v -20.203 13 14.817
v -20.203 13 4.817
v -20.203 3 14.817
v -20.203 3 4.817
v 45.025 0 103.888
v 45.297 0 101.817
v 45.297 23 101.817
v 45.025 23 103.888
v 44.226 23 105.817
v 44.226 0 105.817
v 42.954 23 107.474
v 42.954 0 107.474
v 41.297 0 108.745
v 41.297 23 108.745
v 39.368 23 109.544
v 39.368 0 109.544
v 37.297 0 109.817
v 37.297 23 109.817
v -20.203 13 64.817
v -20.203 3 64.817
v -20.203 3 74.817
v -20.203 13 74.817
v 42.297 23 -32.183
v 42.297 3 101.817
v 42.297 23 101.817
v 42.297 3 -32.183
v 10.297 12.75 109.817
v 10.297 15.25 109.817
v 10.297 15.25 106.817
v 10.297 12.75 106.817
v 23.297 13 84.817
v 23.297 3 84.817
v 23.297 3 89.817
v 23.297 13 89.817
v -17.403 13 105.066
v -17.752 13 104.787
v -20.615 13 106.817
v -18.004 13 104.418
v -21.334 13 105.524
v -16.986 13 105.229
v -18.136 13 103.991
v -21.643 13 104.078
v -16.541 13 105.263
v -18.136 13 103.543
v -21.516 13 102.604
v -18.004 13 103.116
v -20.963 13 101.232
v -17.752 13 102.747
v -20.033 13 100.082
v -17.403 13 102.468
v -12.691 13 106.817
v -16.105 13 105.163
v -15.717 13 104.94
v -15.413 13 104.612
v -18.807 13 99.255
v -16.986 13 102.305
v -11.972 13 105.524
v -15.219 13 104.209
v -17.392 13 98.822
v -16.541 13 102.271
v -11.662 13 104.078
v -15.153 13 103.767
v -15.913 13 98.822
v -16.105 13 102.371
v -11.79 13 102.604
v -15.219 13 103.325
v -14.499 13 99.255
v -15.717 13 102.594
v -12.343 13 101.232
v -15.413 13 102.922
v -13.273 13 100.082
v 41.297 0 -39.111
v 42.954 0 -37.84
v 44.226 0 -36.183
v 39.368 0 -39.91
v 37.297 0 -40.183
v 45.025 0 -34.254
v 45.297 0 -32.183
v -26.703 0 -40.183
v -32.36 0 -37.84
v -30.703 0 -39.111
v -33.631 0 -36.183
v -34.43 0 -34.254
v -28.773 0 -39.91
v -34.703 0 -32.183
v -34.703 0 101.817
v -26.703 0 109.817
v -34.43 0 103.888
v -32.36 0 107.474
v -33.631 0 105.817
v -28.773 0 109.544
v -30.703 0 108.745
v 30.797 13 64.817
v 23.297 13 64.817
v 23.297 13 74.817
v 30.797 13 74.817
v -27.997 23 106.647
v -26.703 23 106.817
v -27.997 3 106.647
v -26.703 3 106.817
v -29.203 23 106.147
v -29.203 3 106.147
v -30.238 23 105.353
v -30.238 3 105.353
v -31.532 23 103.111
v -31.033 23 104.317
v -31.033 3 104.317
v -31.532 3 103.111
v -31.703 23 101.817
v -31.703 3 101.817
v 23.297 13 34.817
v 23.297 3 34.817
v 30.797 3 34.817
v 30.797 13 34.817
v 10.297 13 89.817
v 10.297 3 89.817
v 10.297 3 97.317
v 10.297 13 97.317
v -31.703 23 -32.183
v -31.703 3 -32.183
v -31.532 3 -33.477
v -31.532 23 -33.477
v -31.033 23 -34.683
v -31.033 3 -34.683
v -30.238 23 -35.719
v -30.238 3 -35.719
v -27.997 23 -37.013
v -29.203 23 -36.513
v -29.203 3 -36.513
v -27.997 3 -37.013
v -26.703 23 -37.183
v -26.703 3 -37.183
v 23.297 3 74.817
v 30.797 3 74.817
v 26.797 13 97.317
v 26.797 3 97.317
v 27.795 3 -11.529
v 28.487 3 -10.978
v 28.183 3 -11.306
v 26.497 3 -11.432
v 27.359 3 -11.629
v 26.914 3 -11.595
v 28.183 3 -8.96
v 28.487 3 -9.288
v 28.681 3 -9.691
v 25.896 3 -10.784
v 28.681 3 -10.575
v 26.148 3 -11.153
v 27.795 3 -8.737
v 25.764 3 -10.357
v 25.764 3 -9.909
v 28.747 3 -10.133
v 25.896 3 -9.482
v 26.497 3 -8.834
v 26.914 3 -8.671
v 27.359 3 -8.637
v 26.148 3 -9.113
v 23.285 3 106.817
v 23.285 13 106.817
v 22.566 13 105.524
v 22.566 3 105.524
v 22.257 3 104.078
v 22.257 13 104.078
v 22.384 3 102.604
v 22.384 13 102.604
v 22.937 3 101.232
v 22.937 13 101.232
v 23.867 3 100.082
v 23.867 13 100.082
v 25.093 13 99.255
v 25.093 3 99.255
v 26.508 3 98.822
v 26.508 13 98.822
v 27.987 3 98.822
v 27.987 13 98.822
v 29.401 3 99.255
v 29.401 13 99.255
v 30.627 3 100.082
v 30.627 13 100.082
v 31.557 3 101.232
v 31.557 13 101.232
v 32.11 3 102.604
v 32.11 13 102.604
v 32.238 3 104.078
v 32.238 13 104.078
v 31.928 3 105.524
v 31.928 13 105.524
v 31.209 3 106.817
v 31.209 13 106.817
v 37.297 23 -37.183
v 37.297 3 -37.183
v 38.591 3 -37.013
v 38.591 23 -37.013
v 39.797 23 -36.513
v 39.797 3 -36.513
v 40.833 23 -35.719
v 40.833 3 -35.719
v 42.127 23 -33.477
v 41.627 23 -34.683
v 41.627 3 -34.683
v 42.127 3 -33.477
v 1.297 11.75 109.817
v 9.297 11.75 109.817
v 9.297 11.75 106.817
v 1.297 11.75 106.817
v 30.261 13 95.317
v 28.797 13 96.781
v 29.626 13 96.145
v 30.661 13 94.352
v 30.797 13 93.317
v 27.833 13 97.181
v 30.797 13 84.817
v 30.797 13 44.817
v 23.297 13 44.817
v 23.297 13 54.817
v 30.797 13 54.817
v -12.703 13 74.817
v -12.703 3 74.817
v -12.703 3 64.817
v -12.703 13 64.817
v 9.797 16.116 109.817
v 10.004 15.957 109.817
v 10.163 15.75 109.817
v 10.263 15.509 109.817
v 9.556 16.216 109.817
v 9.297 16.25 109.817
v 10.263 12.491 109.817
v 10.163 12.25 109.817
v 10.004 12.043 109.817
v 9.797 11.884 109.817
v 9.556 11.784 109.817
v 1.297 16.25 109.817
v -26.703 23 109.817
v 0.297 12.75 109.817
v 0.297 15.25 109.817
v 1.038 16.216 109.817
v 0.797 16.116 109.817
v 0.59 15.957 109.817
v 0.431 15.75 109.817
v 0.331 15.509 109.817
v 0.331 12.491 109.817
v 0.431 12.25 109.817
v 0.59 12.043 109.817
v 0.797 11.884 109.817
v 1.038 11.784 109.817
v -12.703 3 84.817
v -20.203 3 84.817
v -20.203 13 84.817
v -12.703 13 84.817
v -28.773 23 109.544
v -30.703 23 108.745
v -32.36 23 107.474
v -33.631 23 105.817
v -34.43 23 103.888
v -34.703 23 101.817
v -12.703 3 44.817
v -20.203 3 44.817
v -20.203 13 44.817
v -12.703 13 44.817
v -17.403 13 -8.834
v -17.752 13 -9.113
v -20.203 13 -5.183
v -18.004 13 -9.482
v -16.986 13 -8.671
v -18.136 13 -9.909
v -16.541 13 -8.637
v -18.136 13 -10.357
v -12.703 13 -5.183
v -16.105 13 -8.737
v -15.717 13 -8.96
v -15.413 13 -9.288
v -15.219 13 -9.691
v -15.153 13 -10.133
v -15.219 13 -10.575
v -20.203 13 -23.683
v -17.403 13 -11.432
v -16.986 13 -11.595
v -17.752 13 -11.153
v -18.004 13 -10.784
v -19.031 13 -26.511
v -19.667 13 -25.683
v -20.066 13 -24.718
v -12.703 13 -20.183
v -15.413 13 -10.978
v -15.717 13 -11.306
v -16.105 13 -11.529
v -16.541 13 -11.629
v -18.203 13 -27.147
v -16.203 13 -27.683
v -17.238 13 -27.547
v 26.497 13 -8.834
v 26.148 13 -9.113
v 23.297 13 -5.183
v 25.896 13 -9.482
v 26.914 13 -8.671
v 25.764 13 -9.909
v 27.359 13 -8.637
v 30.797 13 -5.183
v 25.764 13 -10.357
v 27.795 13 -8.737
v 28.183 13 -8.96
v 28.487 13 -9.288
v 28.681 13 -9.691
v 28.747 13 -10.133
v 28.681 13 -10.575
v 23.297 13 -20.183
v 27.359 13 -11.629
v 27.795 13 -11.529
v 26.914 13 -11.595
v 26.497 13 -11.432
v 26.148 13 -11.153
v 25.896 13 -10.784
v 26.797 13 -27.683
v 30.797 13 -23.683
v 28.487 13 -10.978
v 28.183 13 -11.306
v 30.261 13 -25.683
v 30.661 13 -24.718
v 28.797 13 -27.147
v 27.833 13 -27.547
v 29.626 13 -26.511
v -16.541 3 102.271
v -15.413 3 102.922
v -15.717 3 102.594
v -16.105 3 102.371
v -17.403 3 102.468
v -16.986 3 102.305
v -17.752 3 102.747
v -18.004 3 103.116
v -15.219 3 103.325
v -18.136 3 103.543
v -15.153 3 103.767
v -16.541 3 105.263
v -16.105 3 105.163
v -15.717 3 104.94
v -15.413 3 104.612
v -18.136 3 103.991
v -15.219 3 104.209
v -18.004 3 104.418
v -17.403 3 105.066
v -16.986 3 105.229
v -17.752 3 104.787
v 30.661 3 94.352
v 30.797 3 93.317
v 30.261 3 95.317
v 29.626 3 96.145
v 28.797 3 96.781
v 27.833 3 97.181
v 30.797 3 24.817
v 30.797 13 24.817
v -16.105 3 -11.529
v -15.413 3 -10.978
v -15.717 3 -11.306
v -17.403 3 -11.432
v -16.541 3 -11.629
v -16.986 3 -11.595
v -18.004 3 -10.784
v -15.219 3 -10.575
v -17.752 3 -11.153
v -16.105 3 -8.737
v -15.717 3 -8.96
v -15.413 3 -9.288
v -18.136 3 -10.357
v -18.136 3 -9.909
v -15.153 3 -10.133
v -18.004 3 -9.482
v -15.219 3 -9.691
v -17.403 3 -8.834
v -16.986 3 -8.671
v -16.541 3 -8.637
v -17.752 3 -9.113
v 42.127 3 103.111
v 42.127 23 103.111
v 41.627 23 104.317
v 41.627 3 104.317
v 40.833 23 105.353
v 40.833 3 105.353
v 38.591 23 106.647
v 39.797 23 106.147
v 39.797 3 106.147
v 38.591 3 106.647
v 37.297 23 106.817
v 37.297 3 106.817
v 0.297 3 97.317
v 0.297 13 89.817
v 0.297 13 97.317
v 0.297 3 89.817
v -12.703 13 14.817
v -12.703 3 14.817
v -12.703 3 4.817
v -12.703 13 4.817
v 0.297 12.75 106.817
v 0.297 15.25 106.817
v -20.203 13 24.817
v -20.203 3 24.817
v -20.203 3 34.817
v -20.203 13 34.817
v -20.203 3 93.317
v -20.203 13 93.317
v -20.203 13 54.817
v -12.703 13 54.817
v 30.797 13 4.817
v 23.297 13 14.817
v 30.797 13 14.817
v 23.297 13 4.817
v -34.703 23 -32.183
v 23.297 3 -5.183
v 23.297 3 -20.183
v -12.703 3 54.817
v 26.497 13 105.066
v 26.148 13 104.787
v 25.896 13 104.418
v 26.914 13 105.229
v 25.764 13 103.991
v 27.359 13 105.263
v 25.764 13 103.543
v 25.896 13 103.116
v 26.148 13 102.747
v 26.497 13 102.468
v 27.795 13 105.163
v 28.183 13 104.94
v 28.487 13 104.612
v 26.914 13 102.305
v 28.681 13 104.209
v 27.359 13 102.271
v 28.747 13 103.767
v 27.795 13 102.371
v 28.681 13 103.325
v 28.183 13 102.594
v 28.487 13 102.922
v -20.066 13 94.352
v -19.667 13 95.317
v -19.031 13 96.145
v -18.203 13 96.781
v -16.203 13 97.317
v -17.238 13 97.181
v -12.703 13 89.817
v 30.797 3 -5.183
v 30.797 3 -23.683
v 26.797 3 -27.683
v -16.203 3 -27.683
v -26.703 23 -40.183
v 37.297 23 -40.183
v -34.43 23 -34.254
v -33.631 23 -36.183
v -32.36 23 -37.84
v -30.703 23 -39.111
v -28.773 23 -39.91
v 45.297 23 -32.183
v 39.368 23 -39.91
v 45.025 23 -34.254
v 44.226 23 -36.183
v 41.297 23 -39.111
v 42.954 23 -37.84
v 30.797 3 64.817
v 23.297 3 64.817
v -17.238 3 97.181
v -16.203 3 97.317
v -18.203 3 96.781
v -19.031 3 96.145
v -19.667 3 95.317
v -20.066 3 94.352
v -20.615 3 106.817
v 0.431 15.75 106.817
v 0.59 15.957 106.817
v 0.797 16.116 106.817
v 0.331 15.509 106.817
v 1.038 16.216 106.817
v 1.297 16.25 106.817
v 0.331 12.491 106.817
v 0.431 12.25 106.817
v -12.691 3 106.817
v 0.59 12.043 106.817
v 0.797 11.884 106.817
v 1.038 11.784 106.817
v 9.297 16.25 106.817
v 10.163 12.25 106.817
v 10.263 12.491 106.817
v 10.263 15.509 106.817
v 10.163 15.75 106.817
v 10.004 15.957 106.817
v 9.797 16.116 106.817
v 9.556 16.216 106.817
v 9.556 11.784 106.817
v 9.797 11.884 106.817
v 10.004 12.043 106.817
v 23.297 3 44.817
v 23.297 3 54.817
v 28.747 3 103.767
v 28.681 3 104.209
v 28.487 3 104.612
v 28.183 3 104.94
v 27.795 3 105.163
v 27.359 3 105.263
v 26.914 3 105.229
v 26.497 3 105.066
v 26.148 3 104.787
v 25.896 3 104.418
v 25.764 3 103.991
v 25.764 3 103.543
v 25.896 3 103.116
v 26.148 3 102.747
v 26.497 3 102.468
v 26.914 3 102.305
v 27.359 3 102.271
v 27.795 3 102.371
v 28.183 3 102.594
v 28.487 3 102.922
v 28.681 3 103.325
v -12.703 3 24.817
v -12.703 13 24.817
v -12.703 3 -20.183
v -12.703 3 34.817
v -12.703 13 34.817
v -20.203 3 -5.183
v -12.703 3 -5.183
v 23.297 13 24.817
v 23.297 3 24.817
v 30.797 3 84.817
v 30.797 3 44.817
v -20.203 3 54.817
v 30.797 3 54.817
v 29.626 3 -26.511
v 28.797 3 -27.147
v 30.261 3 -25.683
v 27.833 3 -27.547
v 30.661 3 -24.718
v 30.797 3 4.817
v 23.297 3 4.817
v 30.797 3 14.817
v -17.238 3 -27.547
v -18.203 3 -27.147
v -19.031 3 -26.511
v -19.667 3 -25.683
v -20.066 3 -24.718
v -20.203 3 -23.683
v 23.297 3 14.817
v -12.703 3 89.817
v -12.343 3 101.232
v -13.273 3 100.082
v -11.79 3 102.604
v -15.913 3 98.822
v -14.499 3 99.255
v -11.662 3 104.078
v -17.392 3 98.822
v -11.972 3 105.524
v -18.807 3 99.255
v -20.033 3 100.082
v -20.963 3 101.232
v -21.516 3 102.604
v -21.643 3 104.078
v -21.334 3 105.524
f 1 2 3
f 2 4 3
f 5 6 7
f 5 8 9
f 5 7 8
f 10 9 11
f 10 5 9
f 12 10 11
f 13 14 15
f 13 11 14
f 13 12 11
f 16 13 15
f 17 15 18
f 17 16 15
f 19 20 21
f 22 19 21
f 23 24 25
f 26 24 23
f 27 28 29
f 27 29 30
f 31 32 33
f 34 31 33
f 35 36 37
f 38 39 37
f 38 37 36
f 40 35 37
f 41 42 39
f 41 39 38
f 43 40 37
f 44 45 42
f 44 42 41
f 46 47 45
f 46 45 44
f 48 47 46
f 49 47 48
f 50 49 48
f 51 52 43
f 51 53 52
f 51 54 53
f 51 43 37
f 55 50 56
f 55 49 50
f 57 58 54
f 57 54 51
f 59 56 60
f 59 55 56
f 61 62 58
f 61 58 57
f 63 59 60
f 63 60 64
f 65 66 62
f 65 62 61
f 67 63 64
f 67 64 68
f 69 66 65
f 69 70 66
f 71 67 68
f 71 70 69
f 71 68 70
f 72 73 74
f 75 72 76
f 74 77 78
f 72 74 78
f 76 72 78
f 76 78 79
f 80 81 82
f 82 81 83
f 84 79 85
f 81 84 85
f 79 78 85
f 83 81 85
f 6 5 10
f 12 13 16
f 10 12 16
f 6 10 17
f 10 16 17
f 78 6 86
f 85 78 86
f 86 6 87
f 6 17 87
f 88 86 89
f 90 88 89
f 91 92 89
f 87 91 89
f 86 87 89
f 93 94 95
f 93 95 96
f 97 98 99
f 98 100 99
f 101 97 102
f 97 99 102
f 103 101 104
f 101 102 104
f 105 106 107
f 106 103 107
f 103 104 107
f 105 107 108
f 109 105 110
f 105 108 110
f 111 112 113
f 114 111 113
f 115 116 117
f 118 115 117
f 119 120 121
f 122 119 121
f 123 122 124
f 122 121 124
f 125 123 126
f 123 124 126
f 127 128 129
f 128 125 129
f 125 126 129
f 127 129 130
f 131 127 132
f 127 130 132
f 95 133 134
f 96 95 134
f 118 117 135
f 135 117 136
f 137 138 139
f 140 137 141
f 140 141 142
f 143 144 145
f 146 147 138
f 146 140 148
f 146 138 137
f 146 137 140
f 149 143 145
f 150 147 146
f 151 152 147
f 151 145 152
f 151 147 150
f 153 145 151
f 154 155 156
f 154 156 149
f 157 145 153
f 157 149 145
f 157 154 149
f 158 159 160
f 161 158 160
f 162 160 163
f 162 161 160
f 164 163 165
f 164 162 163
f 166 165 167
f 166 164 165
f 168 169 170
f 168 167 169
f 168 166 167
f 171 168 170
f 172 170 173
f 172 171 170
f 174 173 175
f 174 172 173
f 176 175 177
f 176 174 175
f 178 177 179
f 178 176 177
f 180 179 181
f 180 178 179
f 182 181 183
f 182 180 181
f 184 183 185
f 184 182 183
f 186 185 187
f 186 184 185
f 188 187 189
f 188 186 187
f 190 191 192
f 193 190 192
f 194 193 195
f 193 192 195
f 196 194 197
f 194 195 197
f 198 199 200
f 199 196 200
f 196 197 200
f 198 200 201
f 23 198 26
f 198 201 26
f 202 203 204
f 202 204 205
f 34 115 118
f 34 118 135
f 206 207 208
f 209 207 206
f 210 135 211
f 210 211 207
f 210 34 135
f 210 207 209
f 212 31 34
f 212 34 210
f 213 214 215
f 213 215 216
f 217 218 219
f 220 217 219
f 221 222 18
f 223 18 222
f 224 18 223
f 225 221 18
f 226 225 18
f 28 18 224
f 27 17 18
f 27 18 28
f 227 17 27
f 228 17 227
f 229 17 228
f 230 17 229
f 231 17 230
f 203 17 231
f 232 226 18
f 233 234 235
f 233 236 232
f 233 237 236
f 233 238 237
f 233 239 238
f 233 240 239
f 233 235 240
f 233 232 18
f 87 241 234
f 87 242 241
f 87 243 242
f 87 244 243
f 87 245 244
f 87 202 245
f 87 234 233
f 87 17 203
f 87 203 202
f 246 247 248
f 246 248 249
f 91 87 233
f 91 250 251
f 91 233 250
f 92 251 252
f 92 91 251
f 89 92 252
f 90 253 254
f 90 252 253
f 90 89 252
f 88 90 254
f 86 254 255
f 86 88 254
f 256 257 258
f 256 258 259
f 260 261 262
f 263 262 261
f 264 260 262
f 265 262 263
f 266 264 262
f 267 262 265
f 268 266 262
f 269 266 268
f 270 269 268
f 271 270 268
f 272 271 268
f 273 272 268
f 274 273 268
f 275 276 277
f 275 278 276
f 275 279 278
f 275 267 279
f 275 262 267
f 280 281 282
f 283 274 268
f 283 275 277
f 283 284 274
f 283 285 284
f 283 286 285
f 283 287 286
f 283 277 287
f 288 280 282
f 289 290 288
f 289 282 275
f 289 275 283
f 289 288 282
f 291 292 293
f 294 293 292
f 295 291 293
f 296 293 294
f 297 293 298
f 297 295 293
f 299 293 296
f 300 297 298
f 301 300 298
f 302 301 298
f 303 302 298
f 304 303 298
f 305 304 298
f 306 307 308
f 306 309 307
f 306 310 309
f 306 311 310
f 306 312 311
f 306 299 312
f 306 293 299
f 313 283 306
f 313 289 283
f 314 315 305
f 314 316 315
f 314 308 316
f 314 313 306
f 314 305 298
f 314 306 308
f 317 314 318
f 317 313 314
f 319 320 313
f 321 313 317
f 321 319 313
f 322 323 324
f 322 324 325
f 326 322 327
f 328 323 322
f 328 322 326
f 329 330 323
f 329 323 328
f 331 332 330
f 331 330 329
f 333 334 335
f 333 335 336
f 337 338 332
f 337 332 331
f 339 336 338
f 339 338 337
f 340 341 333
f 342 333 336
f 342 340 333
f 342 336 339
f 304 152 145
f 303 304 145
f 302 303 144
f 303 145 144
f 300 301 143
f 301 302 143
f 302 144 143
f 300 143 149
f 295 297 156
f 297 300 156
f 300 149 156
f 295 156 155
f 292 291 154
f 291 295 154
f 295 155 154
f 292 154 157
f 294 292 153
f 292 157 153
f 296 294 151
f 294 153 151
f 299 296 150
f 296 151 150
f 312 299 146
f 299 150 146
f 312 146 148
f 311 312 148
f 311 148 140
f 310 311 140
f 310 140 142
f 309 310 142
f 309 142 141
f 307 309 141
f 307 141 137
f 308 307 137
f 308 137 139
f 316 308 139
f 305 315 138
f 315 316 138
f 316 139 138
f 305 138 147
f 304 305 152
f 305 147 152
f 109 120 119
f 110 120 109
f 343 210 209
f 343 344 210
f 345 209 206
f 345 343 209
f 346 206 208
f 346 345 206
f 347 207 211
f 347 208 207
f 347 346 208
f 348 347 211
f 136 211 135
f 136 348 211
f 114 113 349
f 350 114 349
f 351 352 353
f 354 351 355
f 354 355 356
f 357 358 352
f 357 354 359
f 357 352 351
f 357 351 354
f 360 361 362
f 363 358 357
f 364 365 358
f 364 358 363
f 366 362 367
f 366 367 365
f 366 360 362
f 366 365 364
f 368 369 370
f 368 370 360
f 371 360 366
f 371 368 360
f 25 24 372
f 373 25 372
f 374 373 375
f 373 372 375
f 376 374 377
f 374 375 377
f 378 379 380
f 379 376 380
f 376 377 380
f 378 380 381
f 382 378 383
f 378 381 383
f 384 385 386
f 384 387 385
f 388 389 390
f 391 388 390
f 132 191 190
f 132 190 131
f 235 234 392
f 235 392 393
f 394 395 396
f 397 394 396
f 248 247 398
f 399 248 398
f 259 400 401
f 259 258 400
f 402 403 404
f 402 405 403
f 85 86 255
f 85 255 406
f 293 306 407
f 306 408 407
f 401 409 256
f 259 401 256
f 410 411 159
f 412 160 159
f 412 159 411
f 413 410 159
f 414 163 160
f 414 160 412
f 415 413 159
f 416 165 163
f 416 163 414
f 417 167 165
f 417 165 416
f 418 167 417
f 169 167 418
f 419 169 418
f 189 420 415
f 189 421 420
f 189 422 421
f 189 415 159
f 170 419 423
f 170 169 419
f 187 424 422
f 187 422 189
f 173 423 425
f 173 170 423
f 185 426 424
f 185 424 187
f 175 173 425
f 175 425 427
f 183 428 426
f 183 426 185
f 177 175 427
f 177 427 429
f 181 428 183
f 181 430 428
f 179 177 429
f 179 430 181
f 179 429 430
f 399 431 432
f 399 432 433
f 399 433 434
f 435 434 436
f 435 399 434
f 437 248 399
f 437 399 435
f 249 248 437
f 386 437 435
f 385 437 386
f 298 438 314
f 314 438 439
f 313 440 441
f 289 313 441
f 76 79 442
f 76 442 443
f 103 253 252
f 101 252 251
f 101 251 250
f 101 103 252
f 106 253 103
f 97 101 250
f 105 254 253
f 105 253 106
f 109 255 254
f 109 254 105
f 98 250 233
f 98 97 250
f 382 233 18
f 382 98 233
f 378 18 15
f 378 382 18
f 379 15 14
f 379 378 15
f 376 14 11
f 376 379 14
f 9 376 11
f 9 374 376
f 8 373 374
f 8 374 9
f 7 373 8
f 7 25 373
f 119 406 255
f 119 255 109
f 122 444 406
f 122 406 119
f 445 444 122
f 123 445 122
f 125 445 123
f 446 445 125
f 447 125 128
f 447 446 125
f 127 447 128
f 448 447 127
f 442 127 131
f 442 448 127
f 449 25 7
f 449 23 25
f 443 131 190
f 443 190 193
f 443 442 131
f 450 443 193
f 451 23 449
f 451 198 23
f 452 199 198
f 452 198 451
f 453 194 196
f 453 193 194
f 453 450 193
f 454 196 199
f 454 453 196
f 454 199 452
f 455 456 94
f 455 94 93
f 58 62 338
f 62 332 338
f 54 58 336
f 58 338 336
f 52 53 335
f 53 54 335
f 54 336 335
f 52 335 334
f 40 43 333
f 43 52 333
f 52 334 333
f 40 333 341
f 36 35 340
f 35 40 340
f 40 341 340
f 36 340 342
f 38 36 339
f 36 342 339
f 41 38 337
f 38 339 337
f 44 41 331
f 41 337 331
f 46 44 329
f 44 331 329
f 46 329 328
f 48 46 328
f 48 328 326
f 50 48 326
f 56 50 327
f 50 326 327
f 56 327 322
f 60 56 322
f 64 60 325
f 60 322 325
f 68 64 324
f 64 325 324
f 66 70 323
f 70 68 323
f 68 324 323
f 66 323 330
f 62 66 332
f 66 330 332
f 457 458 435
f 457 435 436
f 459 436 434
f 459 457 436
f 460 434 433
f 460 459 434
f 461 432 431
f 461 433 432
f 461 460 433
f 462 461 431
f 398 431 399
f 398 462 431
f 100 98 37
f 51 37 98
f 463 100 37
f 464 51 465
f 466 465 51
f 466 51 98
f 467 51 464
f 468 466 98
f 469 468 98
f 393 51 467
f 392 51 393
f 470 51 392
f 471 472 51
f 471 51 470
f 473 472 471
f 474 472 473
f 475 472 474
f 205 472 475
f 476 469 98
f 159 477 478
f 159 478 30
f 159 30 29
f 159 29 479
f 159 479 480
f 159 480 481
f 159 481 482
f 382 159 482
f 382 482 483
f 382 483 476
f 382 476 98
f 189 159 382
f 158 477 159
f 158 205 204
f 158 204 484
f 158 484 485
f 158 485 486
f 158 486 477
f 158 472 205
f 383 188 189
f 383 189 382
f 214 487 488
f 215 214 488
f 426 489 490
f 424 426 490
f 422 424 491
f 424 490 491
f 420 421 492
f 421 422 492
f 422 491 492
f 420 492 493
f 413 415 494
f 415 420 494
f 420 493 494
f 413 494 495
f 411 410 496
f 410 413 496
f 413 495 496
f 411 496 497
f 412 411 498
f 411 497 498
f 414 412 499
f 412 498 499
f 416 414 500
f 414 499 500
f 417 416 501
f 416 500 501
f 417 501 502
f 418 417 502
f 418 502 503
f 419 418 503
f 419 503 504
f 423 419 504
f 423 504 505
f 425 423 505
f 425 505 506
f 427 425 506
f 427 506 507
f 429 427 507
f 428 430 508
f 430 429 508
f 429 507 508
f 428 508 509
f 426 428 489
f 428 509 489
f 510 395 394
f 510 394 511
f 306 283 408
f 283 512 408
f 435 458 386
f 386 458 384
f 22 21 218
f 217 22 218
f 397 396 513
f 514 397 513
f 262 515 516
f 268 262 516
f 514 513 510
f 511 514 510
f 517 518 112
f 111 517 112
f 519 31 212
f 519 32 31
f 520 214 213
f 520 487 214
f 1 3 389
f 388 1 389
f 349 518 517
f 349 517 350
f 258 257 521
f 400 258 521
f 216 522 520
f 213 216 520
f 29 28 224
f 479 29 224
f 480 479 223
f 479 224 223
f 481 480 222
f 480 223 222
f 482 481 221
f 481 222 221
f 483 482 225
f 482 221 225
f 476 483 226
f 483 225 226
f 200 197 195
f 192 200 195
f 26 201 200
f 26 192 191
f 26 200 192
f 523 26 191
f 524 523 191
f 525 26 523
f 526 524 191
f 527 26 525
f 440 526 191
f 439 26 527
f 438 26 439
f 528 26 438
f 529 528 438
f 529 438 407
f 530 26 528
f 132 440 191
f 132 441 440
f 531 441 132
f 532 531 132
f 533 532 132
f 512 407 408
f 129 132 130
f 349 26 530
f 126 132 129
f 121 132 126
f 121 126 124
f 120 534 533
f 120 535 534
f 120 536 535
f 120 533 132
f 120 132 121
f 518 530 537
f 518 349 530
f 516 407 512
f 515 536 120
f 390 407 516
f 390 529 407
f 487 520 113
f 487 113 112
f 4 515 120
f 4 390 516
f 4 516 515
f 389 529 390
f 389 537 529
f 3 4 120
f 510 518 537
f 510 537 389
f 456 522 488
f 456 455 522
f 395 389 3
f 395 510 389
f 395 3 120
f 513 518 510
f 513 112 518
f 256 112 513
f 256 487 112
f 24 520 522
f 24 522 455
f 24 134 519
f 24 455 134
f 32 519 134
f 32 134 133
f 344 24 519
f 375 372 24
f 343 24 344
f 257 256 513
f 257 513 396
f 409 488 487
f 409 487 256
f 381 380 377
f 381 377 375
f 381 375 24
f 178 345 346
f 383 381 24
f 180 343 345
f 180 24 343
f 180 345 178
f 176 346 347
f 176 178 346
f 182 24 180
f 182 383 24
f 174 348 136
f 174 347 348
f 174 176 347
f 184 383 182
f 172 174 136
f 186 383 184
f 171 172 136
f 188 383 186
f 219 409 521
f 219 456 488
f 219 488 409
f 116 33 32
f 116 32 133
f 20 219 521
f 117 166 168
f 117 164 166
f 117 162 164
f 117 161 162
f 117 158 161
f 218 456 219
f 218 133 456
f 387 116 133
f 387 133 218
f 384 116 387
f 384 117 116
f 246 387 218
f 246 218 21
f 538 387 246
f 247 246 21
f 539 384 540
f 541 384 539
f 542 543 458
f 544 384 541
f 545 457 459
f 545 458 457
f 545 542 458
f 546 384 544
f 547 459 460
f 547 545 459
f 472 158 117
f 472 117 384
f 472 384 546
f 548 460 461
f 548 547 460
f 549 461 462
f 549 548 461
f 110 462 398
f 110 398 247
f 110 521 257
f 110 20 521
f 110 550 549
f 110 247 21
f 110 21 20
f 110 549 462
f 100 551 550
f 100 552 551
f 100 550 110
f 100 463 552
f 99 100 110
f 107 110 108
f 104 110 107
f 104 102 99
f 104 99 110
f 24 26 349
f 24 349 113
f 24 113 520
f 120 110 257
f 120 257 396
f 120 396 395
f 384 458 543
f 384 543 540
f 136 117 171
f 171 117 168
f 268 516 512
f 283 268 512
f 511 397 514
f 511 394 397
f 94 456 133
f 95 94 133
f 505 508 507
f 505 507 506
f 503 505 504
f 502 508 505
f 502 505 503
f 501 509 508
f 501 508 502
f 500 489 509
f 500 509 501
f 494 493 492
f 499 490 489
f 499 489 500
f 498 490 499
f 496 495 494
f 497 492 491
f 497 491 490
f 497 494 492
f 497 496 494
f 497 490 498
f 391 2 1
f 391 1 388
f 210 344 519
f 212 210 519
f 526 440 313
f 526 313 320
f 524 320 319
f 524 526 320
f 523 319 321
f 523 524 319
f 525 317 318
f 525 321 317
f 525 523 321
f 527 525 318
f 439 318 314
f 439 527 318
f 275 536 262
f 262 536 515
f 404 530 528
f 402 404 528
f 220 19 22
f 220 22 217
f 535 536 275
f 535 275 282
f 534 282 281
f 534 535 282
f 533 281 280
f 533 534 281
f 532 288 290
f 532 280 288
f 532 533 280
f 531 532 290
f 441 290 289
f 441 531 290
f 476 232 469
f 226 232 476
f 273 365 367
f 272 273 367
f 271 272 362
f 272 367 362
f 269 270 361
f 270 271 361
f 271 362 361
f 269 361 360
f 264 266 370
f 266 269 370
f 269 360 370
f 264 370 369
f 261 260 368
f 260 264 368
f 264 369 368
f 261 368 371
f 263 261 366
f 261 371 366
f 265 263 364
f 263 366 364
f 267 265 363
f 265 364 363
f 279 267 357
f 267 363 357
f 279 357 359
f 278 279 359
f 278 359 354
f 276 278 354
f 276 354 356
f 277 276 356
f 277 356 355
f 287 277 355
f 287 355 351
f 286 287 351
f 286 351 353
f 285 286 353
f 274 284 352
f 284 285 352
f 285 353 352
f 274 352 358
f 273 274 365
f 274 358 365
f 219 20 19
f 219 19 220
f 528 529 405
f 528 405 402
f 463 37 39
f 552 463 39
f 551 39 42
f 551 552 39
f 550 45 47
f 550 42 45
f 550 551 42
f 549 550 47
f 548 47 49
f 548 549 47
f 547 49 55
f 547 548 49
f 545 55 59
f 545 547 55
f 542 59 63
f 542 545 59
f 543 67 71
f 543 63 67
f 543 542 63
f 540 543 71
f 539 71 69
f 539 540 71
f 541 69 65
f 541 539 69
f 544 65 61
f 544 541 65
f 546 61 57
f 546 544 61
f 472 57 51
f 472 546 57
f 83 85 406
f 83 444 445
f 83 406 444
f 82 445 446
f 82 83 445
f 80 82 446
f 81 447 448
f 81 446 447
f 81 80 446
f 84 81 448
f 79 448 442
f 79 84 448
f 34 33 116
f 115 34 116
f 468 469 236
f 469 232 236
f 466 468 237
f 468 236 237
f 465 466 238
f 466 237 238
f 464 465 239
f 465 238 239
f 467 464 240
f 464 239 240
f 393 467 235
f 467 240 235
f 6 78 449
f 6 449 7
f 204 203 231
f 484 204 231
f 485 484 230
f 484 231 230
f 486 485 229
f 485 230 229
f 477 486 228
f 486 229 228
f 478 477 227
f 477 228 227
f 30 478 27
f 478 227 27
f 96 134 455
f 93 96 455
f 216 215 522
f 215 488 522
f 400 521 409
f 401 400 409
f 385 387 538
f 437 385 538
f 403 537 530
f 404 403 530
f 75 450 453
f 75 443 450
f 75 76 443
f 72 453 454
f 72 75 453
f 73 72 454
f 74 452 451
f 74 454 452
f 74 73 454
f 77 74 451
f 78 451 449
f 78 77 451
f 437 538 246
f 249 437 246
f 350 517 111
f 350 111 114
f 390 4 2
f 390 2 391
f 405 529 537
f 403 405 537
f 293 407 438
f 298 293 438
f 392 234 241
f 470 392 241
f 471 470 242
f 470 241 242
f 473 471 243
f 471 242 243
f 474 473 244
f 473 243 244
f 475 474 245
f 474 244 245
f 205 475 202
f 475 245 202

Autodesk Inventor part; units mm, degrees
ref_plane "YZ Plane" through (0, 0, 0) normal (1, 0, 0) x (0, 1, 0)
ref_plane "XZ Plane" through (0, 0, 0) normal (0, 1, 0) x (-1, 0, 0)
ref_plane "XY Plane" through (0, 0, 0) normal (0, 0, 1) x (1, 0, 0)
sketch "Sketch1" plane through (0, 0, 0) normal (0, 1, 0) x (-1, 0, 0)
  line L0 (26.7027, -40.183) -> (-37.2973, -40.183)
  line L1 (-45.2973, -32.183) -> (-45.2973, 101.817)
  line L2 (-37.2973, 109.817) -> (26.7027, 109.817)
  line L3 (34.7027, 101.817) -> (34.7027, -32.183)
  arc A0 (26.7027, -40.183) -> (34.7027, -32.183) centre (26.7027, -32.183) ccw
  arc A1 (-45.2973, -32.183) -> (-37.2973, -40.183) centre (-37.2973, -32.183) ccw
  arc A2 (-37.2973, 109.817) -> (-45.2973, 101.817) centre (-37.2973, 101.817) ccw
  arc A3 (34.7027, 101.817) -> (26.7027, 109.817) centre (26.7027, 101.817) ccw
  point P0 (0, 0)
  point P1 (-45.2973, 109.817)
  point P2 (-45.2973, -40.183)
  point P3 (34.7027, 109.817)
  dimension "d0" = 80
  dimension "d1" = 150
  dimension "d2" = 8
extrude "Extrusion1" add sketch "Sketch1" along normal blind 3
sketch "Sketch2" plane through (0, 3, 0) normal (0, 1, 0) x (1, 0, 0)
  line L0 (-26.7027, 40.183) -> (37.2973, 40.183)
  line L1 (45.2973, 32.183) -> (45.2973, -101.817)
  line L2 (37.2973, -109.817) -> (-26.7027, -109.817)
  line L3 (-34.7027, -101.817) -> (-34.7027, 32.183)
  arc A0 (-26.7027, 40.183) -> (-34.7027, 32.183) centre (-26.7027, 32.183) ccw
  arc A1 (45.2973, 32.183) -> (37.2973, 40.183) centre (37.2973, 32.183) ccw
  arc A2 (37.2973, -109.817) -> (45.2973, -101.817) centre (37.2973, -101.817) ccw
  arc A3 (-34.7027, -101.817) -> (-26.7027, -109.817) centre (-26.7027, -101.817) ccw
  line L4 (37.2973, 37.183) -> (-26.7027, 37.183)
  arc A4 (-26.7027, 37.183) -> (-31.7027, 32.183) centre (-26.7027, 32.183) ccw
  line L5 (-31.7027, 32.183) -> (-31.7027, -101.817)
  arc A5 (-31.7027, -101.817) -> (-26.7027, -106.817) centre (-26.7027, -101.817) ccw
  line L6 (-26.7027, -106.817) -> (37.2973, -106.817)
  arc A6 (37.2973, -106.817) -> (42.2973, -101.817) centre (37.2973, -101.817) ccw
  line L7 (42.2973, -101.817) -> (42.2973, 32.183)
  arc A7 (42.2973, 32.183) -> (37.2973, 37.183) centre (37.2973, 32.183) ccw
  point P0 (0, 0)
  dimension "d5" = 8
  dimension "d6" = 3
extrude "Extrusion2" add sketch "Sketch2" along normal blind 20
sketch "Sketch3" plane through (-26.7027, 0, 109.817) normal (0, 0, 1) x (1, 0, 0)
  line L0 (64, 0) -> (0, 0) projected
  line L1 (32, 0) -> (32, 14)
  line L2 (28, 16.25) -> (36, 16.25)
  line L3 (37, 15.25) -> (37, 12.75)
  line L4 (36, 11.75) -> (28, 11.75)
  line L5 (27, 12.75) -> (27, 15.25)
  line L6 (27, 16.25) -> (37, 11.75) construction
  line L7 (37, 16.25) -> (27, 11.75) construction
  arc A0 (28, 16.25) -> (27, 15.25) centre (28, 15.25) ccw
  arc A1 (37, 15.25) -> (36, 16.25) centre (36, 15.25) ccw
  arc A2 (36, 11.75) -> (37, 12.75) centre (36, 12.75) ccw
  arc A3 (27, 12.75) -> (28, 11.75) centre (28, 12.75) ccw
  point P0 (26.7027, 0)
  dimension "d9" = 14
  dimension "d10" = 10
  dimension "d11" = 4.5
  dimension "d14" = 1
extrude "Extrusion3" cut sketch "Sketch3" against normal blind 3
sketch "Sketch4" plane through (0, 3, 0) normal (0, 1, 0) x (1, 0, 0)
  line L0 (37.2973, 37.183) -> (-26.7027, 37.183) projected
  line L1 (1.2973, -106.817) -> (9.2973, -106.817) projected
  line L2 (-31.7027, 32.183) -> (-31.7027, -101.817) projected
  line L3 (-12.7027, 20.183) -> (23.2973, 20.183)
  circle A0 centre (-16.6527, 10.133) radius 1.5
  circle A1 centre (27.2473, 10.133) radius 1.5
  circle A2 centre (-16.6527, -103.767) radius 1.5
  circle A3 centre (27.2473, -103.767) radius 1.5
  line L4 (26.7973, 27.683) -> (-16.2027, 27.683)
  arc A4 (-16.2027, 27.683) -> (-20.2027, 23.683) centre (-16.2027, 23.683) ccw
  arc A5 (30.7973, 23.683) -> (26.7973, 27.683) centre (26.7973, 23.683) ccw
  arc A6 (26.7973, -97.317) -> (30.7973, -93.317) centre (26.7973, -93.317) ccw
  arc A7 (-20.2027, -93.317) -> (-16.2027, -97.317) centre (-16.2027, -93.317) ccw
  arc A8 (-12.6907, -106.817) -> (-20.6147, -106.817) centre (-16.6527, -103.767) ccw
  line L5 (-20.6147, -106.817) -> (-12.6907, -106.817)
  line L6 (-26.7027, -109.817) -> (37.2973, -109.817) projected
  arc A9 (31.2093, -106.817) -> (23.2853, -106.817) centre (27.2473, -103.767) ccw
  line L7 (23.2853, -106.817) -> (31.2093, -106.817)
  line L8 (-20.2027, 5.183) -> (-12.7027, 5.183)
  line L9 (23.2973, 5.183) -> (30.7973, 5.183)
  line L10 (-20.2027, -4.817) -> (-12.7027, -4.817)
  line L11 (23.2973, -4.817) -> (30.7973, -4.817)
  line L12 (-20.2027, -14.817) -> (-12.7027, -14.817)
  line L13 (23.2973, -14.817) -> (30.7973, -14.817)
  line L14 (-20.2027, -24.817) -> (-12.7027, -24.817)
  line L15 (23.2973, -24.817) -> (30.7973, -24.817)
  line L16 (-20.2027, -34.817) -> (-12.7027, -34.817)
  line L17 (23.2973, -34.817) -> (30.7973, -34.817)
  line L18 (-20.2027, -44.817) -> (-12.7027, -44.817)
  line L19 (23.2973, -44.817) -> (30.7973, -44.817)
  line L20 (-20.2027, -54.817) -> (-12.7027, -54.817)
  line L21 (23.2973, -54.817) -> (30.7973, -54.817)
  line L22 (-20.2027, -64.817) -> (-12.7027, -64.817)
  line L23 (23.2973, -64.817) -> (30.7973, -64.817)
  line L24 (-20.2027, -74.817) -> (-12.7027, -74.817)
  line L25 (23.2973, -74.817) -> (30.7973, -74.817)
  line L26 (-20.2027, -84.817) -> (-12.7027, -84.817)
  line L27 (23.2973, -84.817) -> (30.7973, -84.817)
  line L28 (-12.7027, 5.183) -> (-12.7027, 20.183)
  line L29 (-20.2027, 23.683) -> (-20.2027, 5.183)
  line L30 (23.2973, 20.183) -> (23.2973, 5.183)
  line L31 (30.7973, 5.183) -> (30.7973, 23.683)
  line L32 (-12.7027, -89.817) -> (-12.7027, -84.817)
  line L33 (-20.2027, -84.817) -> (-20.2027, -93.317)
  line L34 (23.2973, -84.817) -> (23.2973, -89.817)
  line L35 (30.7973, -93.317) -> (30.7973, -84.817)
  line L36 (-12.7027, -74.817) -> (-12.7027, -64.817)
  line L37 (-20.2027, -64.817) -> (-20.2027, -74.817)
  line L38 (23.2973, -64.817) -> (23.2973, -74.817)
  line L39 (30.7973, -74.817) -> (30.7973, -64.817)
  line L40 (30.7973, -14.817) -> (30.7973, -4.817)
  line L41 (23.2973, -4.817) -> (23.2973, -14.817)
  line L42 (-12.7027, -14.817) -> (-12.7027, -4.817)
  line L43 (-20.2027, -4.817) -> (-20.2027, -14.817)
  line L44 (-20.2027, -24.817) -> (-20.2027, -34.817)
  line L45 (-20.2027, -44.817) -> (-20.2027, -54.817)
  line L46 (-12.7027, -54.817) -> (-12.7027, -44.817)
  line L47 (-12.7027, -34.817) -> (-12.7027, -24.817)
  line L48 (23.2973, -24.817) -> (23.2973, -34.817)
  line L49 (23.2973, -44.817) -> (23.2973, -54.817)
  line L50 (30.7973, -54.817) -> (30.7973, -44.817)
  line L51 (30.7973, -34.817) -> (30.7973, -24.817)
  line L52 (0.2973, -89.817) -> (0.2973, -97.317)
  line L53 (10.2973, -89.817) -> (10.2973, -97.317)
  line L54 (23.2973, -89.817) -> (10.2973, -89.817)
  line L55 (0.2973, -89.817) -> (-12.7027, -89.817)
  line L56 (-16.2027, -97.317) -> (0.2973, -97.317)
  line L57 (10.2973, -97.317) -> (26.7973, -97.317)
  point P0 (0, 0)
  dimension "d25" = 36
  dimension "d26" = 110
  dimension "d29" = 3
  dimension "d30" = 7.5
  dimension "d31" = 4
  dimension "d32" = 3.5
  dimension "d33" = 3.5
extrude "Extrusion4" add sketch "Sketch4" along normal blind 10
properties part number "csing"
